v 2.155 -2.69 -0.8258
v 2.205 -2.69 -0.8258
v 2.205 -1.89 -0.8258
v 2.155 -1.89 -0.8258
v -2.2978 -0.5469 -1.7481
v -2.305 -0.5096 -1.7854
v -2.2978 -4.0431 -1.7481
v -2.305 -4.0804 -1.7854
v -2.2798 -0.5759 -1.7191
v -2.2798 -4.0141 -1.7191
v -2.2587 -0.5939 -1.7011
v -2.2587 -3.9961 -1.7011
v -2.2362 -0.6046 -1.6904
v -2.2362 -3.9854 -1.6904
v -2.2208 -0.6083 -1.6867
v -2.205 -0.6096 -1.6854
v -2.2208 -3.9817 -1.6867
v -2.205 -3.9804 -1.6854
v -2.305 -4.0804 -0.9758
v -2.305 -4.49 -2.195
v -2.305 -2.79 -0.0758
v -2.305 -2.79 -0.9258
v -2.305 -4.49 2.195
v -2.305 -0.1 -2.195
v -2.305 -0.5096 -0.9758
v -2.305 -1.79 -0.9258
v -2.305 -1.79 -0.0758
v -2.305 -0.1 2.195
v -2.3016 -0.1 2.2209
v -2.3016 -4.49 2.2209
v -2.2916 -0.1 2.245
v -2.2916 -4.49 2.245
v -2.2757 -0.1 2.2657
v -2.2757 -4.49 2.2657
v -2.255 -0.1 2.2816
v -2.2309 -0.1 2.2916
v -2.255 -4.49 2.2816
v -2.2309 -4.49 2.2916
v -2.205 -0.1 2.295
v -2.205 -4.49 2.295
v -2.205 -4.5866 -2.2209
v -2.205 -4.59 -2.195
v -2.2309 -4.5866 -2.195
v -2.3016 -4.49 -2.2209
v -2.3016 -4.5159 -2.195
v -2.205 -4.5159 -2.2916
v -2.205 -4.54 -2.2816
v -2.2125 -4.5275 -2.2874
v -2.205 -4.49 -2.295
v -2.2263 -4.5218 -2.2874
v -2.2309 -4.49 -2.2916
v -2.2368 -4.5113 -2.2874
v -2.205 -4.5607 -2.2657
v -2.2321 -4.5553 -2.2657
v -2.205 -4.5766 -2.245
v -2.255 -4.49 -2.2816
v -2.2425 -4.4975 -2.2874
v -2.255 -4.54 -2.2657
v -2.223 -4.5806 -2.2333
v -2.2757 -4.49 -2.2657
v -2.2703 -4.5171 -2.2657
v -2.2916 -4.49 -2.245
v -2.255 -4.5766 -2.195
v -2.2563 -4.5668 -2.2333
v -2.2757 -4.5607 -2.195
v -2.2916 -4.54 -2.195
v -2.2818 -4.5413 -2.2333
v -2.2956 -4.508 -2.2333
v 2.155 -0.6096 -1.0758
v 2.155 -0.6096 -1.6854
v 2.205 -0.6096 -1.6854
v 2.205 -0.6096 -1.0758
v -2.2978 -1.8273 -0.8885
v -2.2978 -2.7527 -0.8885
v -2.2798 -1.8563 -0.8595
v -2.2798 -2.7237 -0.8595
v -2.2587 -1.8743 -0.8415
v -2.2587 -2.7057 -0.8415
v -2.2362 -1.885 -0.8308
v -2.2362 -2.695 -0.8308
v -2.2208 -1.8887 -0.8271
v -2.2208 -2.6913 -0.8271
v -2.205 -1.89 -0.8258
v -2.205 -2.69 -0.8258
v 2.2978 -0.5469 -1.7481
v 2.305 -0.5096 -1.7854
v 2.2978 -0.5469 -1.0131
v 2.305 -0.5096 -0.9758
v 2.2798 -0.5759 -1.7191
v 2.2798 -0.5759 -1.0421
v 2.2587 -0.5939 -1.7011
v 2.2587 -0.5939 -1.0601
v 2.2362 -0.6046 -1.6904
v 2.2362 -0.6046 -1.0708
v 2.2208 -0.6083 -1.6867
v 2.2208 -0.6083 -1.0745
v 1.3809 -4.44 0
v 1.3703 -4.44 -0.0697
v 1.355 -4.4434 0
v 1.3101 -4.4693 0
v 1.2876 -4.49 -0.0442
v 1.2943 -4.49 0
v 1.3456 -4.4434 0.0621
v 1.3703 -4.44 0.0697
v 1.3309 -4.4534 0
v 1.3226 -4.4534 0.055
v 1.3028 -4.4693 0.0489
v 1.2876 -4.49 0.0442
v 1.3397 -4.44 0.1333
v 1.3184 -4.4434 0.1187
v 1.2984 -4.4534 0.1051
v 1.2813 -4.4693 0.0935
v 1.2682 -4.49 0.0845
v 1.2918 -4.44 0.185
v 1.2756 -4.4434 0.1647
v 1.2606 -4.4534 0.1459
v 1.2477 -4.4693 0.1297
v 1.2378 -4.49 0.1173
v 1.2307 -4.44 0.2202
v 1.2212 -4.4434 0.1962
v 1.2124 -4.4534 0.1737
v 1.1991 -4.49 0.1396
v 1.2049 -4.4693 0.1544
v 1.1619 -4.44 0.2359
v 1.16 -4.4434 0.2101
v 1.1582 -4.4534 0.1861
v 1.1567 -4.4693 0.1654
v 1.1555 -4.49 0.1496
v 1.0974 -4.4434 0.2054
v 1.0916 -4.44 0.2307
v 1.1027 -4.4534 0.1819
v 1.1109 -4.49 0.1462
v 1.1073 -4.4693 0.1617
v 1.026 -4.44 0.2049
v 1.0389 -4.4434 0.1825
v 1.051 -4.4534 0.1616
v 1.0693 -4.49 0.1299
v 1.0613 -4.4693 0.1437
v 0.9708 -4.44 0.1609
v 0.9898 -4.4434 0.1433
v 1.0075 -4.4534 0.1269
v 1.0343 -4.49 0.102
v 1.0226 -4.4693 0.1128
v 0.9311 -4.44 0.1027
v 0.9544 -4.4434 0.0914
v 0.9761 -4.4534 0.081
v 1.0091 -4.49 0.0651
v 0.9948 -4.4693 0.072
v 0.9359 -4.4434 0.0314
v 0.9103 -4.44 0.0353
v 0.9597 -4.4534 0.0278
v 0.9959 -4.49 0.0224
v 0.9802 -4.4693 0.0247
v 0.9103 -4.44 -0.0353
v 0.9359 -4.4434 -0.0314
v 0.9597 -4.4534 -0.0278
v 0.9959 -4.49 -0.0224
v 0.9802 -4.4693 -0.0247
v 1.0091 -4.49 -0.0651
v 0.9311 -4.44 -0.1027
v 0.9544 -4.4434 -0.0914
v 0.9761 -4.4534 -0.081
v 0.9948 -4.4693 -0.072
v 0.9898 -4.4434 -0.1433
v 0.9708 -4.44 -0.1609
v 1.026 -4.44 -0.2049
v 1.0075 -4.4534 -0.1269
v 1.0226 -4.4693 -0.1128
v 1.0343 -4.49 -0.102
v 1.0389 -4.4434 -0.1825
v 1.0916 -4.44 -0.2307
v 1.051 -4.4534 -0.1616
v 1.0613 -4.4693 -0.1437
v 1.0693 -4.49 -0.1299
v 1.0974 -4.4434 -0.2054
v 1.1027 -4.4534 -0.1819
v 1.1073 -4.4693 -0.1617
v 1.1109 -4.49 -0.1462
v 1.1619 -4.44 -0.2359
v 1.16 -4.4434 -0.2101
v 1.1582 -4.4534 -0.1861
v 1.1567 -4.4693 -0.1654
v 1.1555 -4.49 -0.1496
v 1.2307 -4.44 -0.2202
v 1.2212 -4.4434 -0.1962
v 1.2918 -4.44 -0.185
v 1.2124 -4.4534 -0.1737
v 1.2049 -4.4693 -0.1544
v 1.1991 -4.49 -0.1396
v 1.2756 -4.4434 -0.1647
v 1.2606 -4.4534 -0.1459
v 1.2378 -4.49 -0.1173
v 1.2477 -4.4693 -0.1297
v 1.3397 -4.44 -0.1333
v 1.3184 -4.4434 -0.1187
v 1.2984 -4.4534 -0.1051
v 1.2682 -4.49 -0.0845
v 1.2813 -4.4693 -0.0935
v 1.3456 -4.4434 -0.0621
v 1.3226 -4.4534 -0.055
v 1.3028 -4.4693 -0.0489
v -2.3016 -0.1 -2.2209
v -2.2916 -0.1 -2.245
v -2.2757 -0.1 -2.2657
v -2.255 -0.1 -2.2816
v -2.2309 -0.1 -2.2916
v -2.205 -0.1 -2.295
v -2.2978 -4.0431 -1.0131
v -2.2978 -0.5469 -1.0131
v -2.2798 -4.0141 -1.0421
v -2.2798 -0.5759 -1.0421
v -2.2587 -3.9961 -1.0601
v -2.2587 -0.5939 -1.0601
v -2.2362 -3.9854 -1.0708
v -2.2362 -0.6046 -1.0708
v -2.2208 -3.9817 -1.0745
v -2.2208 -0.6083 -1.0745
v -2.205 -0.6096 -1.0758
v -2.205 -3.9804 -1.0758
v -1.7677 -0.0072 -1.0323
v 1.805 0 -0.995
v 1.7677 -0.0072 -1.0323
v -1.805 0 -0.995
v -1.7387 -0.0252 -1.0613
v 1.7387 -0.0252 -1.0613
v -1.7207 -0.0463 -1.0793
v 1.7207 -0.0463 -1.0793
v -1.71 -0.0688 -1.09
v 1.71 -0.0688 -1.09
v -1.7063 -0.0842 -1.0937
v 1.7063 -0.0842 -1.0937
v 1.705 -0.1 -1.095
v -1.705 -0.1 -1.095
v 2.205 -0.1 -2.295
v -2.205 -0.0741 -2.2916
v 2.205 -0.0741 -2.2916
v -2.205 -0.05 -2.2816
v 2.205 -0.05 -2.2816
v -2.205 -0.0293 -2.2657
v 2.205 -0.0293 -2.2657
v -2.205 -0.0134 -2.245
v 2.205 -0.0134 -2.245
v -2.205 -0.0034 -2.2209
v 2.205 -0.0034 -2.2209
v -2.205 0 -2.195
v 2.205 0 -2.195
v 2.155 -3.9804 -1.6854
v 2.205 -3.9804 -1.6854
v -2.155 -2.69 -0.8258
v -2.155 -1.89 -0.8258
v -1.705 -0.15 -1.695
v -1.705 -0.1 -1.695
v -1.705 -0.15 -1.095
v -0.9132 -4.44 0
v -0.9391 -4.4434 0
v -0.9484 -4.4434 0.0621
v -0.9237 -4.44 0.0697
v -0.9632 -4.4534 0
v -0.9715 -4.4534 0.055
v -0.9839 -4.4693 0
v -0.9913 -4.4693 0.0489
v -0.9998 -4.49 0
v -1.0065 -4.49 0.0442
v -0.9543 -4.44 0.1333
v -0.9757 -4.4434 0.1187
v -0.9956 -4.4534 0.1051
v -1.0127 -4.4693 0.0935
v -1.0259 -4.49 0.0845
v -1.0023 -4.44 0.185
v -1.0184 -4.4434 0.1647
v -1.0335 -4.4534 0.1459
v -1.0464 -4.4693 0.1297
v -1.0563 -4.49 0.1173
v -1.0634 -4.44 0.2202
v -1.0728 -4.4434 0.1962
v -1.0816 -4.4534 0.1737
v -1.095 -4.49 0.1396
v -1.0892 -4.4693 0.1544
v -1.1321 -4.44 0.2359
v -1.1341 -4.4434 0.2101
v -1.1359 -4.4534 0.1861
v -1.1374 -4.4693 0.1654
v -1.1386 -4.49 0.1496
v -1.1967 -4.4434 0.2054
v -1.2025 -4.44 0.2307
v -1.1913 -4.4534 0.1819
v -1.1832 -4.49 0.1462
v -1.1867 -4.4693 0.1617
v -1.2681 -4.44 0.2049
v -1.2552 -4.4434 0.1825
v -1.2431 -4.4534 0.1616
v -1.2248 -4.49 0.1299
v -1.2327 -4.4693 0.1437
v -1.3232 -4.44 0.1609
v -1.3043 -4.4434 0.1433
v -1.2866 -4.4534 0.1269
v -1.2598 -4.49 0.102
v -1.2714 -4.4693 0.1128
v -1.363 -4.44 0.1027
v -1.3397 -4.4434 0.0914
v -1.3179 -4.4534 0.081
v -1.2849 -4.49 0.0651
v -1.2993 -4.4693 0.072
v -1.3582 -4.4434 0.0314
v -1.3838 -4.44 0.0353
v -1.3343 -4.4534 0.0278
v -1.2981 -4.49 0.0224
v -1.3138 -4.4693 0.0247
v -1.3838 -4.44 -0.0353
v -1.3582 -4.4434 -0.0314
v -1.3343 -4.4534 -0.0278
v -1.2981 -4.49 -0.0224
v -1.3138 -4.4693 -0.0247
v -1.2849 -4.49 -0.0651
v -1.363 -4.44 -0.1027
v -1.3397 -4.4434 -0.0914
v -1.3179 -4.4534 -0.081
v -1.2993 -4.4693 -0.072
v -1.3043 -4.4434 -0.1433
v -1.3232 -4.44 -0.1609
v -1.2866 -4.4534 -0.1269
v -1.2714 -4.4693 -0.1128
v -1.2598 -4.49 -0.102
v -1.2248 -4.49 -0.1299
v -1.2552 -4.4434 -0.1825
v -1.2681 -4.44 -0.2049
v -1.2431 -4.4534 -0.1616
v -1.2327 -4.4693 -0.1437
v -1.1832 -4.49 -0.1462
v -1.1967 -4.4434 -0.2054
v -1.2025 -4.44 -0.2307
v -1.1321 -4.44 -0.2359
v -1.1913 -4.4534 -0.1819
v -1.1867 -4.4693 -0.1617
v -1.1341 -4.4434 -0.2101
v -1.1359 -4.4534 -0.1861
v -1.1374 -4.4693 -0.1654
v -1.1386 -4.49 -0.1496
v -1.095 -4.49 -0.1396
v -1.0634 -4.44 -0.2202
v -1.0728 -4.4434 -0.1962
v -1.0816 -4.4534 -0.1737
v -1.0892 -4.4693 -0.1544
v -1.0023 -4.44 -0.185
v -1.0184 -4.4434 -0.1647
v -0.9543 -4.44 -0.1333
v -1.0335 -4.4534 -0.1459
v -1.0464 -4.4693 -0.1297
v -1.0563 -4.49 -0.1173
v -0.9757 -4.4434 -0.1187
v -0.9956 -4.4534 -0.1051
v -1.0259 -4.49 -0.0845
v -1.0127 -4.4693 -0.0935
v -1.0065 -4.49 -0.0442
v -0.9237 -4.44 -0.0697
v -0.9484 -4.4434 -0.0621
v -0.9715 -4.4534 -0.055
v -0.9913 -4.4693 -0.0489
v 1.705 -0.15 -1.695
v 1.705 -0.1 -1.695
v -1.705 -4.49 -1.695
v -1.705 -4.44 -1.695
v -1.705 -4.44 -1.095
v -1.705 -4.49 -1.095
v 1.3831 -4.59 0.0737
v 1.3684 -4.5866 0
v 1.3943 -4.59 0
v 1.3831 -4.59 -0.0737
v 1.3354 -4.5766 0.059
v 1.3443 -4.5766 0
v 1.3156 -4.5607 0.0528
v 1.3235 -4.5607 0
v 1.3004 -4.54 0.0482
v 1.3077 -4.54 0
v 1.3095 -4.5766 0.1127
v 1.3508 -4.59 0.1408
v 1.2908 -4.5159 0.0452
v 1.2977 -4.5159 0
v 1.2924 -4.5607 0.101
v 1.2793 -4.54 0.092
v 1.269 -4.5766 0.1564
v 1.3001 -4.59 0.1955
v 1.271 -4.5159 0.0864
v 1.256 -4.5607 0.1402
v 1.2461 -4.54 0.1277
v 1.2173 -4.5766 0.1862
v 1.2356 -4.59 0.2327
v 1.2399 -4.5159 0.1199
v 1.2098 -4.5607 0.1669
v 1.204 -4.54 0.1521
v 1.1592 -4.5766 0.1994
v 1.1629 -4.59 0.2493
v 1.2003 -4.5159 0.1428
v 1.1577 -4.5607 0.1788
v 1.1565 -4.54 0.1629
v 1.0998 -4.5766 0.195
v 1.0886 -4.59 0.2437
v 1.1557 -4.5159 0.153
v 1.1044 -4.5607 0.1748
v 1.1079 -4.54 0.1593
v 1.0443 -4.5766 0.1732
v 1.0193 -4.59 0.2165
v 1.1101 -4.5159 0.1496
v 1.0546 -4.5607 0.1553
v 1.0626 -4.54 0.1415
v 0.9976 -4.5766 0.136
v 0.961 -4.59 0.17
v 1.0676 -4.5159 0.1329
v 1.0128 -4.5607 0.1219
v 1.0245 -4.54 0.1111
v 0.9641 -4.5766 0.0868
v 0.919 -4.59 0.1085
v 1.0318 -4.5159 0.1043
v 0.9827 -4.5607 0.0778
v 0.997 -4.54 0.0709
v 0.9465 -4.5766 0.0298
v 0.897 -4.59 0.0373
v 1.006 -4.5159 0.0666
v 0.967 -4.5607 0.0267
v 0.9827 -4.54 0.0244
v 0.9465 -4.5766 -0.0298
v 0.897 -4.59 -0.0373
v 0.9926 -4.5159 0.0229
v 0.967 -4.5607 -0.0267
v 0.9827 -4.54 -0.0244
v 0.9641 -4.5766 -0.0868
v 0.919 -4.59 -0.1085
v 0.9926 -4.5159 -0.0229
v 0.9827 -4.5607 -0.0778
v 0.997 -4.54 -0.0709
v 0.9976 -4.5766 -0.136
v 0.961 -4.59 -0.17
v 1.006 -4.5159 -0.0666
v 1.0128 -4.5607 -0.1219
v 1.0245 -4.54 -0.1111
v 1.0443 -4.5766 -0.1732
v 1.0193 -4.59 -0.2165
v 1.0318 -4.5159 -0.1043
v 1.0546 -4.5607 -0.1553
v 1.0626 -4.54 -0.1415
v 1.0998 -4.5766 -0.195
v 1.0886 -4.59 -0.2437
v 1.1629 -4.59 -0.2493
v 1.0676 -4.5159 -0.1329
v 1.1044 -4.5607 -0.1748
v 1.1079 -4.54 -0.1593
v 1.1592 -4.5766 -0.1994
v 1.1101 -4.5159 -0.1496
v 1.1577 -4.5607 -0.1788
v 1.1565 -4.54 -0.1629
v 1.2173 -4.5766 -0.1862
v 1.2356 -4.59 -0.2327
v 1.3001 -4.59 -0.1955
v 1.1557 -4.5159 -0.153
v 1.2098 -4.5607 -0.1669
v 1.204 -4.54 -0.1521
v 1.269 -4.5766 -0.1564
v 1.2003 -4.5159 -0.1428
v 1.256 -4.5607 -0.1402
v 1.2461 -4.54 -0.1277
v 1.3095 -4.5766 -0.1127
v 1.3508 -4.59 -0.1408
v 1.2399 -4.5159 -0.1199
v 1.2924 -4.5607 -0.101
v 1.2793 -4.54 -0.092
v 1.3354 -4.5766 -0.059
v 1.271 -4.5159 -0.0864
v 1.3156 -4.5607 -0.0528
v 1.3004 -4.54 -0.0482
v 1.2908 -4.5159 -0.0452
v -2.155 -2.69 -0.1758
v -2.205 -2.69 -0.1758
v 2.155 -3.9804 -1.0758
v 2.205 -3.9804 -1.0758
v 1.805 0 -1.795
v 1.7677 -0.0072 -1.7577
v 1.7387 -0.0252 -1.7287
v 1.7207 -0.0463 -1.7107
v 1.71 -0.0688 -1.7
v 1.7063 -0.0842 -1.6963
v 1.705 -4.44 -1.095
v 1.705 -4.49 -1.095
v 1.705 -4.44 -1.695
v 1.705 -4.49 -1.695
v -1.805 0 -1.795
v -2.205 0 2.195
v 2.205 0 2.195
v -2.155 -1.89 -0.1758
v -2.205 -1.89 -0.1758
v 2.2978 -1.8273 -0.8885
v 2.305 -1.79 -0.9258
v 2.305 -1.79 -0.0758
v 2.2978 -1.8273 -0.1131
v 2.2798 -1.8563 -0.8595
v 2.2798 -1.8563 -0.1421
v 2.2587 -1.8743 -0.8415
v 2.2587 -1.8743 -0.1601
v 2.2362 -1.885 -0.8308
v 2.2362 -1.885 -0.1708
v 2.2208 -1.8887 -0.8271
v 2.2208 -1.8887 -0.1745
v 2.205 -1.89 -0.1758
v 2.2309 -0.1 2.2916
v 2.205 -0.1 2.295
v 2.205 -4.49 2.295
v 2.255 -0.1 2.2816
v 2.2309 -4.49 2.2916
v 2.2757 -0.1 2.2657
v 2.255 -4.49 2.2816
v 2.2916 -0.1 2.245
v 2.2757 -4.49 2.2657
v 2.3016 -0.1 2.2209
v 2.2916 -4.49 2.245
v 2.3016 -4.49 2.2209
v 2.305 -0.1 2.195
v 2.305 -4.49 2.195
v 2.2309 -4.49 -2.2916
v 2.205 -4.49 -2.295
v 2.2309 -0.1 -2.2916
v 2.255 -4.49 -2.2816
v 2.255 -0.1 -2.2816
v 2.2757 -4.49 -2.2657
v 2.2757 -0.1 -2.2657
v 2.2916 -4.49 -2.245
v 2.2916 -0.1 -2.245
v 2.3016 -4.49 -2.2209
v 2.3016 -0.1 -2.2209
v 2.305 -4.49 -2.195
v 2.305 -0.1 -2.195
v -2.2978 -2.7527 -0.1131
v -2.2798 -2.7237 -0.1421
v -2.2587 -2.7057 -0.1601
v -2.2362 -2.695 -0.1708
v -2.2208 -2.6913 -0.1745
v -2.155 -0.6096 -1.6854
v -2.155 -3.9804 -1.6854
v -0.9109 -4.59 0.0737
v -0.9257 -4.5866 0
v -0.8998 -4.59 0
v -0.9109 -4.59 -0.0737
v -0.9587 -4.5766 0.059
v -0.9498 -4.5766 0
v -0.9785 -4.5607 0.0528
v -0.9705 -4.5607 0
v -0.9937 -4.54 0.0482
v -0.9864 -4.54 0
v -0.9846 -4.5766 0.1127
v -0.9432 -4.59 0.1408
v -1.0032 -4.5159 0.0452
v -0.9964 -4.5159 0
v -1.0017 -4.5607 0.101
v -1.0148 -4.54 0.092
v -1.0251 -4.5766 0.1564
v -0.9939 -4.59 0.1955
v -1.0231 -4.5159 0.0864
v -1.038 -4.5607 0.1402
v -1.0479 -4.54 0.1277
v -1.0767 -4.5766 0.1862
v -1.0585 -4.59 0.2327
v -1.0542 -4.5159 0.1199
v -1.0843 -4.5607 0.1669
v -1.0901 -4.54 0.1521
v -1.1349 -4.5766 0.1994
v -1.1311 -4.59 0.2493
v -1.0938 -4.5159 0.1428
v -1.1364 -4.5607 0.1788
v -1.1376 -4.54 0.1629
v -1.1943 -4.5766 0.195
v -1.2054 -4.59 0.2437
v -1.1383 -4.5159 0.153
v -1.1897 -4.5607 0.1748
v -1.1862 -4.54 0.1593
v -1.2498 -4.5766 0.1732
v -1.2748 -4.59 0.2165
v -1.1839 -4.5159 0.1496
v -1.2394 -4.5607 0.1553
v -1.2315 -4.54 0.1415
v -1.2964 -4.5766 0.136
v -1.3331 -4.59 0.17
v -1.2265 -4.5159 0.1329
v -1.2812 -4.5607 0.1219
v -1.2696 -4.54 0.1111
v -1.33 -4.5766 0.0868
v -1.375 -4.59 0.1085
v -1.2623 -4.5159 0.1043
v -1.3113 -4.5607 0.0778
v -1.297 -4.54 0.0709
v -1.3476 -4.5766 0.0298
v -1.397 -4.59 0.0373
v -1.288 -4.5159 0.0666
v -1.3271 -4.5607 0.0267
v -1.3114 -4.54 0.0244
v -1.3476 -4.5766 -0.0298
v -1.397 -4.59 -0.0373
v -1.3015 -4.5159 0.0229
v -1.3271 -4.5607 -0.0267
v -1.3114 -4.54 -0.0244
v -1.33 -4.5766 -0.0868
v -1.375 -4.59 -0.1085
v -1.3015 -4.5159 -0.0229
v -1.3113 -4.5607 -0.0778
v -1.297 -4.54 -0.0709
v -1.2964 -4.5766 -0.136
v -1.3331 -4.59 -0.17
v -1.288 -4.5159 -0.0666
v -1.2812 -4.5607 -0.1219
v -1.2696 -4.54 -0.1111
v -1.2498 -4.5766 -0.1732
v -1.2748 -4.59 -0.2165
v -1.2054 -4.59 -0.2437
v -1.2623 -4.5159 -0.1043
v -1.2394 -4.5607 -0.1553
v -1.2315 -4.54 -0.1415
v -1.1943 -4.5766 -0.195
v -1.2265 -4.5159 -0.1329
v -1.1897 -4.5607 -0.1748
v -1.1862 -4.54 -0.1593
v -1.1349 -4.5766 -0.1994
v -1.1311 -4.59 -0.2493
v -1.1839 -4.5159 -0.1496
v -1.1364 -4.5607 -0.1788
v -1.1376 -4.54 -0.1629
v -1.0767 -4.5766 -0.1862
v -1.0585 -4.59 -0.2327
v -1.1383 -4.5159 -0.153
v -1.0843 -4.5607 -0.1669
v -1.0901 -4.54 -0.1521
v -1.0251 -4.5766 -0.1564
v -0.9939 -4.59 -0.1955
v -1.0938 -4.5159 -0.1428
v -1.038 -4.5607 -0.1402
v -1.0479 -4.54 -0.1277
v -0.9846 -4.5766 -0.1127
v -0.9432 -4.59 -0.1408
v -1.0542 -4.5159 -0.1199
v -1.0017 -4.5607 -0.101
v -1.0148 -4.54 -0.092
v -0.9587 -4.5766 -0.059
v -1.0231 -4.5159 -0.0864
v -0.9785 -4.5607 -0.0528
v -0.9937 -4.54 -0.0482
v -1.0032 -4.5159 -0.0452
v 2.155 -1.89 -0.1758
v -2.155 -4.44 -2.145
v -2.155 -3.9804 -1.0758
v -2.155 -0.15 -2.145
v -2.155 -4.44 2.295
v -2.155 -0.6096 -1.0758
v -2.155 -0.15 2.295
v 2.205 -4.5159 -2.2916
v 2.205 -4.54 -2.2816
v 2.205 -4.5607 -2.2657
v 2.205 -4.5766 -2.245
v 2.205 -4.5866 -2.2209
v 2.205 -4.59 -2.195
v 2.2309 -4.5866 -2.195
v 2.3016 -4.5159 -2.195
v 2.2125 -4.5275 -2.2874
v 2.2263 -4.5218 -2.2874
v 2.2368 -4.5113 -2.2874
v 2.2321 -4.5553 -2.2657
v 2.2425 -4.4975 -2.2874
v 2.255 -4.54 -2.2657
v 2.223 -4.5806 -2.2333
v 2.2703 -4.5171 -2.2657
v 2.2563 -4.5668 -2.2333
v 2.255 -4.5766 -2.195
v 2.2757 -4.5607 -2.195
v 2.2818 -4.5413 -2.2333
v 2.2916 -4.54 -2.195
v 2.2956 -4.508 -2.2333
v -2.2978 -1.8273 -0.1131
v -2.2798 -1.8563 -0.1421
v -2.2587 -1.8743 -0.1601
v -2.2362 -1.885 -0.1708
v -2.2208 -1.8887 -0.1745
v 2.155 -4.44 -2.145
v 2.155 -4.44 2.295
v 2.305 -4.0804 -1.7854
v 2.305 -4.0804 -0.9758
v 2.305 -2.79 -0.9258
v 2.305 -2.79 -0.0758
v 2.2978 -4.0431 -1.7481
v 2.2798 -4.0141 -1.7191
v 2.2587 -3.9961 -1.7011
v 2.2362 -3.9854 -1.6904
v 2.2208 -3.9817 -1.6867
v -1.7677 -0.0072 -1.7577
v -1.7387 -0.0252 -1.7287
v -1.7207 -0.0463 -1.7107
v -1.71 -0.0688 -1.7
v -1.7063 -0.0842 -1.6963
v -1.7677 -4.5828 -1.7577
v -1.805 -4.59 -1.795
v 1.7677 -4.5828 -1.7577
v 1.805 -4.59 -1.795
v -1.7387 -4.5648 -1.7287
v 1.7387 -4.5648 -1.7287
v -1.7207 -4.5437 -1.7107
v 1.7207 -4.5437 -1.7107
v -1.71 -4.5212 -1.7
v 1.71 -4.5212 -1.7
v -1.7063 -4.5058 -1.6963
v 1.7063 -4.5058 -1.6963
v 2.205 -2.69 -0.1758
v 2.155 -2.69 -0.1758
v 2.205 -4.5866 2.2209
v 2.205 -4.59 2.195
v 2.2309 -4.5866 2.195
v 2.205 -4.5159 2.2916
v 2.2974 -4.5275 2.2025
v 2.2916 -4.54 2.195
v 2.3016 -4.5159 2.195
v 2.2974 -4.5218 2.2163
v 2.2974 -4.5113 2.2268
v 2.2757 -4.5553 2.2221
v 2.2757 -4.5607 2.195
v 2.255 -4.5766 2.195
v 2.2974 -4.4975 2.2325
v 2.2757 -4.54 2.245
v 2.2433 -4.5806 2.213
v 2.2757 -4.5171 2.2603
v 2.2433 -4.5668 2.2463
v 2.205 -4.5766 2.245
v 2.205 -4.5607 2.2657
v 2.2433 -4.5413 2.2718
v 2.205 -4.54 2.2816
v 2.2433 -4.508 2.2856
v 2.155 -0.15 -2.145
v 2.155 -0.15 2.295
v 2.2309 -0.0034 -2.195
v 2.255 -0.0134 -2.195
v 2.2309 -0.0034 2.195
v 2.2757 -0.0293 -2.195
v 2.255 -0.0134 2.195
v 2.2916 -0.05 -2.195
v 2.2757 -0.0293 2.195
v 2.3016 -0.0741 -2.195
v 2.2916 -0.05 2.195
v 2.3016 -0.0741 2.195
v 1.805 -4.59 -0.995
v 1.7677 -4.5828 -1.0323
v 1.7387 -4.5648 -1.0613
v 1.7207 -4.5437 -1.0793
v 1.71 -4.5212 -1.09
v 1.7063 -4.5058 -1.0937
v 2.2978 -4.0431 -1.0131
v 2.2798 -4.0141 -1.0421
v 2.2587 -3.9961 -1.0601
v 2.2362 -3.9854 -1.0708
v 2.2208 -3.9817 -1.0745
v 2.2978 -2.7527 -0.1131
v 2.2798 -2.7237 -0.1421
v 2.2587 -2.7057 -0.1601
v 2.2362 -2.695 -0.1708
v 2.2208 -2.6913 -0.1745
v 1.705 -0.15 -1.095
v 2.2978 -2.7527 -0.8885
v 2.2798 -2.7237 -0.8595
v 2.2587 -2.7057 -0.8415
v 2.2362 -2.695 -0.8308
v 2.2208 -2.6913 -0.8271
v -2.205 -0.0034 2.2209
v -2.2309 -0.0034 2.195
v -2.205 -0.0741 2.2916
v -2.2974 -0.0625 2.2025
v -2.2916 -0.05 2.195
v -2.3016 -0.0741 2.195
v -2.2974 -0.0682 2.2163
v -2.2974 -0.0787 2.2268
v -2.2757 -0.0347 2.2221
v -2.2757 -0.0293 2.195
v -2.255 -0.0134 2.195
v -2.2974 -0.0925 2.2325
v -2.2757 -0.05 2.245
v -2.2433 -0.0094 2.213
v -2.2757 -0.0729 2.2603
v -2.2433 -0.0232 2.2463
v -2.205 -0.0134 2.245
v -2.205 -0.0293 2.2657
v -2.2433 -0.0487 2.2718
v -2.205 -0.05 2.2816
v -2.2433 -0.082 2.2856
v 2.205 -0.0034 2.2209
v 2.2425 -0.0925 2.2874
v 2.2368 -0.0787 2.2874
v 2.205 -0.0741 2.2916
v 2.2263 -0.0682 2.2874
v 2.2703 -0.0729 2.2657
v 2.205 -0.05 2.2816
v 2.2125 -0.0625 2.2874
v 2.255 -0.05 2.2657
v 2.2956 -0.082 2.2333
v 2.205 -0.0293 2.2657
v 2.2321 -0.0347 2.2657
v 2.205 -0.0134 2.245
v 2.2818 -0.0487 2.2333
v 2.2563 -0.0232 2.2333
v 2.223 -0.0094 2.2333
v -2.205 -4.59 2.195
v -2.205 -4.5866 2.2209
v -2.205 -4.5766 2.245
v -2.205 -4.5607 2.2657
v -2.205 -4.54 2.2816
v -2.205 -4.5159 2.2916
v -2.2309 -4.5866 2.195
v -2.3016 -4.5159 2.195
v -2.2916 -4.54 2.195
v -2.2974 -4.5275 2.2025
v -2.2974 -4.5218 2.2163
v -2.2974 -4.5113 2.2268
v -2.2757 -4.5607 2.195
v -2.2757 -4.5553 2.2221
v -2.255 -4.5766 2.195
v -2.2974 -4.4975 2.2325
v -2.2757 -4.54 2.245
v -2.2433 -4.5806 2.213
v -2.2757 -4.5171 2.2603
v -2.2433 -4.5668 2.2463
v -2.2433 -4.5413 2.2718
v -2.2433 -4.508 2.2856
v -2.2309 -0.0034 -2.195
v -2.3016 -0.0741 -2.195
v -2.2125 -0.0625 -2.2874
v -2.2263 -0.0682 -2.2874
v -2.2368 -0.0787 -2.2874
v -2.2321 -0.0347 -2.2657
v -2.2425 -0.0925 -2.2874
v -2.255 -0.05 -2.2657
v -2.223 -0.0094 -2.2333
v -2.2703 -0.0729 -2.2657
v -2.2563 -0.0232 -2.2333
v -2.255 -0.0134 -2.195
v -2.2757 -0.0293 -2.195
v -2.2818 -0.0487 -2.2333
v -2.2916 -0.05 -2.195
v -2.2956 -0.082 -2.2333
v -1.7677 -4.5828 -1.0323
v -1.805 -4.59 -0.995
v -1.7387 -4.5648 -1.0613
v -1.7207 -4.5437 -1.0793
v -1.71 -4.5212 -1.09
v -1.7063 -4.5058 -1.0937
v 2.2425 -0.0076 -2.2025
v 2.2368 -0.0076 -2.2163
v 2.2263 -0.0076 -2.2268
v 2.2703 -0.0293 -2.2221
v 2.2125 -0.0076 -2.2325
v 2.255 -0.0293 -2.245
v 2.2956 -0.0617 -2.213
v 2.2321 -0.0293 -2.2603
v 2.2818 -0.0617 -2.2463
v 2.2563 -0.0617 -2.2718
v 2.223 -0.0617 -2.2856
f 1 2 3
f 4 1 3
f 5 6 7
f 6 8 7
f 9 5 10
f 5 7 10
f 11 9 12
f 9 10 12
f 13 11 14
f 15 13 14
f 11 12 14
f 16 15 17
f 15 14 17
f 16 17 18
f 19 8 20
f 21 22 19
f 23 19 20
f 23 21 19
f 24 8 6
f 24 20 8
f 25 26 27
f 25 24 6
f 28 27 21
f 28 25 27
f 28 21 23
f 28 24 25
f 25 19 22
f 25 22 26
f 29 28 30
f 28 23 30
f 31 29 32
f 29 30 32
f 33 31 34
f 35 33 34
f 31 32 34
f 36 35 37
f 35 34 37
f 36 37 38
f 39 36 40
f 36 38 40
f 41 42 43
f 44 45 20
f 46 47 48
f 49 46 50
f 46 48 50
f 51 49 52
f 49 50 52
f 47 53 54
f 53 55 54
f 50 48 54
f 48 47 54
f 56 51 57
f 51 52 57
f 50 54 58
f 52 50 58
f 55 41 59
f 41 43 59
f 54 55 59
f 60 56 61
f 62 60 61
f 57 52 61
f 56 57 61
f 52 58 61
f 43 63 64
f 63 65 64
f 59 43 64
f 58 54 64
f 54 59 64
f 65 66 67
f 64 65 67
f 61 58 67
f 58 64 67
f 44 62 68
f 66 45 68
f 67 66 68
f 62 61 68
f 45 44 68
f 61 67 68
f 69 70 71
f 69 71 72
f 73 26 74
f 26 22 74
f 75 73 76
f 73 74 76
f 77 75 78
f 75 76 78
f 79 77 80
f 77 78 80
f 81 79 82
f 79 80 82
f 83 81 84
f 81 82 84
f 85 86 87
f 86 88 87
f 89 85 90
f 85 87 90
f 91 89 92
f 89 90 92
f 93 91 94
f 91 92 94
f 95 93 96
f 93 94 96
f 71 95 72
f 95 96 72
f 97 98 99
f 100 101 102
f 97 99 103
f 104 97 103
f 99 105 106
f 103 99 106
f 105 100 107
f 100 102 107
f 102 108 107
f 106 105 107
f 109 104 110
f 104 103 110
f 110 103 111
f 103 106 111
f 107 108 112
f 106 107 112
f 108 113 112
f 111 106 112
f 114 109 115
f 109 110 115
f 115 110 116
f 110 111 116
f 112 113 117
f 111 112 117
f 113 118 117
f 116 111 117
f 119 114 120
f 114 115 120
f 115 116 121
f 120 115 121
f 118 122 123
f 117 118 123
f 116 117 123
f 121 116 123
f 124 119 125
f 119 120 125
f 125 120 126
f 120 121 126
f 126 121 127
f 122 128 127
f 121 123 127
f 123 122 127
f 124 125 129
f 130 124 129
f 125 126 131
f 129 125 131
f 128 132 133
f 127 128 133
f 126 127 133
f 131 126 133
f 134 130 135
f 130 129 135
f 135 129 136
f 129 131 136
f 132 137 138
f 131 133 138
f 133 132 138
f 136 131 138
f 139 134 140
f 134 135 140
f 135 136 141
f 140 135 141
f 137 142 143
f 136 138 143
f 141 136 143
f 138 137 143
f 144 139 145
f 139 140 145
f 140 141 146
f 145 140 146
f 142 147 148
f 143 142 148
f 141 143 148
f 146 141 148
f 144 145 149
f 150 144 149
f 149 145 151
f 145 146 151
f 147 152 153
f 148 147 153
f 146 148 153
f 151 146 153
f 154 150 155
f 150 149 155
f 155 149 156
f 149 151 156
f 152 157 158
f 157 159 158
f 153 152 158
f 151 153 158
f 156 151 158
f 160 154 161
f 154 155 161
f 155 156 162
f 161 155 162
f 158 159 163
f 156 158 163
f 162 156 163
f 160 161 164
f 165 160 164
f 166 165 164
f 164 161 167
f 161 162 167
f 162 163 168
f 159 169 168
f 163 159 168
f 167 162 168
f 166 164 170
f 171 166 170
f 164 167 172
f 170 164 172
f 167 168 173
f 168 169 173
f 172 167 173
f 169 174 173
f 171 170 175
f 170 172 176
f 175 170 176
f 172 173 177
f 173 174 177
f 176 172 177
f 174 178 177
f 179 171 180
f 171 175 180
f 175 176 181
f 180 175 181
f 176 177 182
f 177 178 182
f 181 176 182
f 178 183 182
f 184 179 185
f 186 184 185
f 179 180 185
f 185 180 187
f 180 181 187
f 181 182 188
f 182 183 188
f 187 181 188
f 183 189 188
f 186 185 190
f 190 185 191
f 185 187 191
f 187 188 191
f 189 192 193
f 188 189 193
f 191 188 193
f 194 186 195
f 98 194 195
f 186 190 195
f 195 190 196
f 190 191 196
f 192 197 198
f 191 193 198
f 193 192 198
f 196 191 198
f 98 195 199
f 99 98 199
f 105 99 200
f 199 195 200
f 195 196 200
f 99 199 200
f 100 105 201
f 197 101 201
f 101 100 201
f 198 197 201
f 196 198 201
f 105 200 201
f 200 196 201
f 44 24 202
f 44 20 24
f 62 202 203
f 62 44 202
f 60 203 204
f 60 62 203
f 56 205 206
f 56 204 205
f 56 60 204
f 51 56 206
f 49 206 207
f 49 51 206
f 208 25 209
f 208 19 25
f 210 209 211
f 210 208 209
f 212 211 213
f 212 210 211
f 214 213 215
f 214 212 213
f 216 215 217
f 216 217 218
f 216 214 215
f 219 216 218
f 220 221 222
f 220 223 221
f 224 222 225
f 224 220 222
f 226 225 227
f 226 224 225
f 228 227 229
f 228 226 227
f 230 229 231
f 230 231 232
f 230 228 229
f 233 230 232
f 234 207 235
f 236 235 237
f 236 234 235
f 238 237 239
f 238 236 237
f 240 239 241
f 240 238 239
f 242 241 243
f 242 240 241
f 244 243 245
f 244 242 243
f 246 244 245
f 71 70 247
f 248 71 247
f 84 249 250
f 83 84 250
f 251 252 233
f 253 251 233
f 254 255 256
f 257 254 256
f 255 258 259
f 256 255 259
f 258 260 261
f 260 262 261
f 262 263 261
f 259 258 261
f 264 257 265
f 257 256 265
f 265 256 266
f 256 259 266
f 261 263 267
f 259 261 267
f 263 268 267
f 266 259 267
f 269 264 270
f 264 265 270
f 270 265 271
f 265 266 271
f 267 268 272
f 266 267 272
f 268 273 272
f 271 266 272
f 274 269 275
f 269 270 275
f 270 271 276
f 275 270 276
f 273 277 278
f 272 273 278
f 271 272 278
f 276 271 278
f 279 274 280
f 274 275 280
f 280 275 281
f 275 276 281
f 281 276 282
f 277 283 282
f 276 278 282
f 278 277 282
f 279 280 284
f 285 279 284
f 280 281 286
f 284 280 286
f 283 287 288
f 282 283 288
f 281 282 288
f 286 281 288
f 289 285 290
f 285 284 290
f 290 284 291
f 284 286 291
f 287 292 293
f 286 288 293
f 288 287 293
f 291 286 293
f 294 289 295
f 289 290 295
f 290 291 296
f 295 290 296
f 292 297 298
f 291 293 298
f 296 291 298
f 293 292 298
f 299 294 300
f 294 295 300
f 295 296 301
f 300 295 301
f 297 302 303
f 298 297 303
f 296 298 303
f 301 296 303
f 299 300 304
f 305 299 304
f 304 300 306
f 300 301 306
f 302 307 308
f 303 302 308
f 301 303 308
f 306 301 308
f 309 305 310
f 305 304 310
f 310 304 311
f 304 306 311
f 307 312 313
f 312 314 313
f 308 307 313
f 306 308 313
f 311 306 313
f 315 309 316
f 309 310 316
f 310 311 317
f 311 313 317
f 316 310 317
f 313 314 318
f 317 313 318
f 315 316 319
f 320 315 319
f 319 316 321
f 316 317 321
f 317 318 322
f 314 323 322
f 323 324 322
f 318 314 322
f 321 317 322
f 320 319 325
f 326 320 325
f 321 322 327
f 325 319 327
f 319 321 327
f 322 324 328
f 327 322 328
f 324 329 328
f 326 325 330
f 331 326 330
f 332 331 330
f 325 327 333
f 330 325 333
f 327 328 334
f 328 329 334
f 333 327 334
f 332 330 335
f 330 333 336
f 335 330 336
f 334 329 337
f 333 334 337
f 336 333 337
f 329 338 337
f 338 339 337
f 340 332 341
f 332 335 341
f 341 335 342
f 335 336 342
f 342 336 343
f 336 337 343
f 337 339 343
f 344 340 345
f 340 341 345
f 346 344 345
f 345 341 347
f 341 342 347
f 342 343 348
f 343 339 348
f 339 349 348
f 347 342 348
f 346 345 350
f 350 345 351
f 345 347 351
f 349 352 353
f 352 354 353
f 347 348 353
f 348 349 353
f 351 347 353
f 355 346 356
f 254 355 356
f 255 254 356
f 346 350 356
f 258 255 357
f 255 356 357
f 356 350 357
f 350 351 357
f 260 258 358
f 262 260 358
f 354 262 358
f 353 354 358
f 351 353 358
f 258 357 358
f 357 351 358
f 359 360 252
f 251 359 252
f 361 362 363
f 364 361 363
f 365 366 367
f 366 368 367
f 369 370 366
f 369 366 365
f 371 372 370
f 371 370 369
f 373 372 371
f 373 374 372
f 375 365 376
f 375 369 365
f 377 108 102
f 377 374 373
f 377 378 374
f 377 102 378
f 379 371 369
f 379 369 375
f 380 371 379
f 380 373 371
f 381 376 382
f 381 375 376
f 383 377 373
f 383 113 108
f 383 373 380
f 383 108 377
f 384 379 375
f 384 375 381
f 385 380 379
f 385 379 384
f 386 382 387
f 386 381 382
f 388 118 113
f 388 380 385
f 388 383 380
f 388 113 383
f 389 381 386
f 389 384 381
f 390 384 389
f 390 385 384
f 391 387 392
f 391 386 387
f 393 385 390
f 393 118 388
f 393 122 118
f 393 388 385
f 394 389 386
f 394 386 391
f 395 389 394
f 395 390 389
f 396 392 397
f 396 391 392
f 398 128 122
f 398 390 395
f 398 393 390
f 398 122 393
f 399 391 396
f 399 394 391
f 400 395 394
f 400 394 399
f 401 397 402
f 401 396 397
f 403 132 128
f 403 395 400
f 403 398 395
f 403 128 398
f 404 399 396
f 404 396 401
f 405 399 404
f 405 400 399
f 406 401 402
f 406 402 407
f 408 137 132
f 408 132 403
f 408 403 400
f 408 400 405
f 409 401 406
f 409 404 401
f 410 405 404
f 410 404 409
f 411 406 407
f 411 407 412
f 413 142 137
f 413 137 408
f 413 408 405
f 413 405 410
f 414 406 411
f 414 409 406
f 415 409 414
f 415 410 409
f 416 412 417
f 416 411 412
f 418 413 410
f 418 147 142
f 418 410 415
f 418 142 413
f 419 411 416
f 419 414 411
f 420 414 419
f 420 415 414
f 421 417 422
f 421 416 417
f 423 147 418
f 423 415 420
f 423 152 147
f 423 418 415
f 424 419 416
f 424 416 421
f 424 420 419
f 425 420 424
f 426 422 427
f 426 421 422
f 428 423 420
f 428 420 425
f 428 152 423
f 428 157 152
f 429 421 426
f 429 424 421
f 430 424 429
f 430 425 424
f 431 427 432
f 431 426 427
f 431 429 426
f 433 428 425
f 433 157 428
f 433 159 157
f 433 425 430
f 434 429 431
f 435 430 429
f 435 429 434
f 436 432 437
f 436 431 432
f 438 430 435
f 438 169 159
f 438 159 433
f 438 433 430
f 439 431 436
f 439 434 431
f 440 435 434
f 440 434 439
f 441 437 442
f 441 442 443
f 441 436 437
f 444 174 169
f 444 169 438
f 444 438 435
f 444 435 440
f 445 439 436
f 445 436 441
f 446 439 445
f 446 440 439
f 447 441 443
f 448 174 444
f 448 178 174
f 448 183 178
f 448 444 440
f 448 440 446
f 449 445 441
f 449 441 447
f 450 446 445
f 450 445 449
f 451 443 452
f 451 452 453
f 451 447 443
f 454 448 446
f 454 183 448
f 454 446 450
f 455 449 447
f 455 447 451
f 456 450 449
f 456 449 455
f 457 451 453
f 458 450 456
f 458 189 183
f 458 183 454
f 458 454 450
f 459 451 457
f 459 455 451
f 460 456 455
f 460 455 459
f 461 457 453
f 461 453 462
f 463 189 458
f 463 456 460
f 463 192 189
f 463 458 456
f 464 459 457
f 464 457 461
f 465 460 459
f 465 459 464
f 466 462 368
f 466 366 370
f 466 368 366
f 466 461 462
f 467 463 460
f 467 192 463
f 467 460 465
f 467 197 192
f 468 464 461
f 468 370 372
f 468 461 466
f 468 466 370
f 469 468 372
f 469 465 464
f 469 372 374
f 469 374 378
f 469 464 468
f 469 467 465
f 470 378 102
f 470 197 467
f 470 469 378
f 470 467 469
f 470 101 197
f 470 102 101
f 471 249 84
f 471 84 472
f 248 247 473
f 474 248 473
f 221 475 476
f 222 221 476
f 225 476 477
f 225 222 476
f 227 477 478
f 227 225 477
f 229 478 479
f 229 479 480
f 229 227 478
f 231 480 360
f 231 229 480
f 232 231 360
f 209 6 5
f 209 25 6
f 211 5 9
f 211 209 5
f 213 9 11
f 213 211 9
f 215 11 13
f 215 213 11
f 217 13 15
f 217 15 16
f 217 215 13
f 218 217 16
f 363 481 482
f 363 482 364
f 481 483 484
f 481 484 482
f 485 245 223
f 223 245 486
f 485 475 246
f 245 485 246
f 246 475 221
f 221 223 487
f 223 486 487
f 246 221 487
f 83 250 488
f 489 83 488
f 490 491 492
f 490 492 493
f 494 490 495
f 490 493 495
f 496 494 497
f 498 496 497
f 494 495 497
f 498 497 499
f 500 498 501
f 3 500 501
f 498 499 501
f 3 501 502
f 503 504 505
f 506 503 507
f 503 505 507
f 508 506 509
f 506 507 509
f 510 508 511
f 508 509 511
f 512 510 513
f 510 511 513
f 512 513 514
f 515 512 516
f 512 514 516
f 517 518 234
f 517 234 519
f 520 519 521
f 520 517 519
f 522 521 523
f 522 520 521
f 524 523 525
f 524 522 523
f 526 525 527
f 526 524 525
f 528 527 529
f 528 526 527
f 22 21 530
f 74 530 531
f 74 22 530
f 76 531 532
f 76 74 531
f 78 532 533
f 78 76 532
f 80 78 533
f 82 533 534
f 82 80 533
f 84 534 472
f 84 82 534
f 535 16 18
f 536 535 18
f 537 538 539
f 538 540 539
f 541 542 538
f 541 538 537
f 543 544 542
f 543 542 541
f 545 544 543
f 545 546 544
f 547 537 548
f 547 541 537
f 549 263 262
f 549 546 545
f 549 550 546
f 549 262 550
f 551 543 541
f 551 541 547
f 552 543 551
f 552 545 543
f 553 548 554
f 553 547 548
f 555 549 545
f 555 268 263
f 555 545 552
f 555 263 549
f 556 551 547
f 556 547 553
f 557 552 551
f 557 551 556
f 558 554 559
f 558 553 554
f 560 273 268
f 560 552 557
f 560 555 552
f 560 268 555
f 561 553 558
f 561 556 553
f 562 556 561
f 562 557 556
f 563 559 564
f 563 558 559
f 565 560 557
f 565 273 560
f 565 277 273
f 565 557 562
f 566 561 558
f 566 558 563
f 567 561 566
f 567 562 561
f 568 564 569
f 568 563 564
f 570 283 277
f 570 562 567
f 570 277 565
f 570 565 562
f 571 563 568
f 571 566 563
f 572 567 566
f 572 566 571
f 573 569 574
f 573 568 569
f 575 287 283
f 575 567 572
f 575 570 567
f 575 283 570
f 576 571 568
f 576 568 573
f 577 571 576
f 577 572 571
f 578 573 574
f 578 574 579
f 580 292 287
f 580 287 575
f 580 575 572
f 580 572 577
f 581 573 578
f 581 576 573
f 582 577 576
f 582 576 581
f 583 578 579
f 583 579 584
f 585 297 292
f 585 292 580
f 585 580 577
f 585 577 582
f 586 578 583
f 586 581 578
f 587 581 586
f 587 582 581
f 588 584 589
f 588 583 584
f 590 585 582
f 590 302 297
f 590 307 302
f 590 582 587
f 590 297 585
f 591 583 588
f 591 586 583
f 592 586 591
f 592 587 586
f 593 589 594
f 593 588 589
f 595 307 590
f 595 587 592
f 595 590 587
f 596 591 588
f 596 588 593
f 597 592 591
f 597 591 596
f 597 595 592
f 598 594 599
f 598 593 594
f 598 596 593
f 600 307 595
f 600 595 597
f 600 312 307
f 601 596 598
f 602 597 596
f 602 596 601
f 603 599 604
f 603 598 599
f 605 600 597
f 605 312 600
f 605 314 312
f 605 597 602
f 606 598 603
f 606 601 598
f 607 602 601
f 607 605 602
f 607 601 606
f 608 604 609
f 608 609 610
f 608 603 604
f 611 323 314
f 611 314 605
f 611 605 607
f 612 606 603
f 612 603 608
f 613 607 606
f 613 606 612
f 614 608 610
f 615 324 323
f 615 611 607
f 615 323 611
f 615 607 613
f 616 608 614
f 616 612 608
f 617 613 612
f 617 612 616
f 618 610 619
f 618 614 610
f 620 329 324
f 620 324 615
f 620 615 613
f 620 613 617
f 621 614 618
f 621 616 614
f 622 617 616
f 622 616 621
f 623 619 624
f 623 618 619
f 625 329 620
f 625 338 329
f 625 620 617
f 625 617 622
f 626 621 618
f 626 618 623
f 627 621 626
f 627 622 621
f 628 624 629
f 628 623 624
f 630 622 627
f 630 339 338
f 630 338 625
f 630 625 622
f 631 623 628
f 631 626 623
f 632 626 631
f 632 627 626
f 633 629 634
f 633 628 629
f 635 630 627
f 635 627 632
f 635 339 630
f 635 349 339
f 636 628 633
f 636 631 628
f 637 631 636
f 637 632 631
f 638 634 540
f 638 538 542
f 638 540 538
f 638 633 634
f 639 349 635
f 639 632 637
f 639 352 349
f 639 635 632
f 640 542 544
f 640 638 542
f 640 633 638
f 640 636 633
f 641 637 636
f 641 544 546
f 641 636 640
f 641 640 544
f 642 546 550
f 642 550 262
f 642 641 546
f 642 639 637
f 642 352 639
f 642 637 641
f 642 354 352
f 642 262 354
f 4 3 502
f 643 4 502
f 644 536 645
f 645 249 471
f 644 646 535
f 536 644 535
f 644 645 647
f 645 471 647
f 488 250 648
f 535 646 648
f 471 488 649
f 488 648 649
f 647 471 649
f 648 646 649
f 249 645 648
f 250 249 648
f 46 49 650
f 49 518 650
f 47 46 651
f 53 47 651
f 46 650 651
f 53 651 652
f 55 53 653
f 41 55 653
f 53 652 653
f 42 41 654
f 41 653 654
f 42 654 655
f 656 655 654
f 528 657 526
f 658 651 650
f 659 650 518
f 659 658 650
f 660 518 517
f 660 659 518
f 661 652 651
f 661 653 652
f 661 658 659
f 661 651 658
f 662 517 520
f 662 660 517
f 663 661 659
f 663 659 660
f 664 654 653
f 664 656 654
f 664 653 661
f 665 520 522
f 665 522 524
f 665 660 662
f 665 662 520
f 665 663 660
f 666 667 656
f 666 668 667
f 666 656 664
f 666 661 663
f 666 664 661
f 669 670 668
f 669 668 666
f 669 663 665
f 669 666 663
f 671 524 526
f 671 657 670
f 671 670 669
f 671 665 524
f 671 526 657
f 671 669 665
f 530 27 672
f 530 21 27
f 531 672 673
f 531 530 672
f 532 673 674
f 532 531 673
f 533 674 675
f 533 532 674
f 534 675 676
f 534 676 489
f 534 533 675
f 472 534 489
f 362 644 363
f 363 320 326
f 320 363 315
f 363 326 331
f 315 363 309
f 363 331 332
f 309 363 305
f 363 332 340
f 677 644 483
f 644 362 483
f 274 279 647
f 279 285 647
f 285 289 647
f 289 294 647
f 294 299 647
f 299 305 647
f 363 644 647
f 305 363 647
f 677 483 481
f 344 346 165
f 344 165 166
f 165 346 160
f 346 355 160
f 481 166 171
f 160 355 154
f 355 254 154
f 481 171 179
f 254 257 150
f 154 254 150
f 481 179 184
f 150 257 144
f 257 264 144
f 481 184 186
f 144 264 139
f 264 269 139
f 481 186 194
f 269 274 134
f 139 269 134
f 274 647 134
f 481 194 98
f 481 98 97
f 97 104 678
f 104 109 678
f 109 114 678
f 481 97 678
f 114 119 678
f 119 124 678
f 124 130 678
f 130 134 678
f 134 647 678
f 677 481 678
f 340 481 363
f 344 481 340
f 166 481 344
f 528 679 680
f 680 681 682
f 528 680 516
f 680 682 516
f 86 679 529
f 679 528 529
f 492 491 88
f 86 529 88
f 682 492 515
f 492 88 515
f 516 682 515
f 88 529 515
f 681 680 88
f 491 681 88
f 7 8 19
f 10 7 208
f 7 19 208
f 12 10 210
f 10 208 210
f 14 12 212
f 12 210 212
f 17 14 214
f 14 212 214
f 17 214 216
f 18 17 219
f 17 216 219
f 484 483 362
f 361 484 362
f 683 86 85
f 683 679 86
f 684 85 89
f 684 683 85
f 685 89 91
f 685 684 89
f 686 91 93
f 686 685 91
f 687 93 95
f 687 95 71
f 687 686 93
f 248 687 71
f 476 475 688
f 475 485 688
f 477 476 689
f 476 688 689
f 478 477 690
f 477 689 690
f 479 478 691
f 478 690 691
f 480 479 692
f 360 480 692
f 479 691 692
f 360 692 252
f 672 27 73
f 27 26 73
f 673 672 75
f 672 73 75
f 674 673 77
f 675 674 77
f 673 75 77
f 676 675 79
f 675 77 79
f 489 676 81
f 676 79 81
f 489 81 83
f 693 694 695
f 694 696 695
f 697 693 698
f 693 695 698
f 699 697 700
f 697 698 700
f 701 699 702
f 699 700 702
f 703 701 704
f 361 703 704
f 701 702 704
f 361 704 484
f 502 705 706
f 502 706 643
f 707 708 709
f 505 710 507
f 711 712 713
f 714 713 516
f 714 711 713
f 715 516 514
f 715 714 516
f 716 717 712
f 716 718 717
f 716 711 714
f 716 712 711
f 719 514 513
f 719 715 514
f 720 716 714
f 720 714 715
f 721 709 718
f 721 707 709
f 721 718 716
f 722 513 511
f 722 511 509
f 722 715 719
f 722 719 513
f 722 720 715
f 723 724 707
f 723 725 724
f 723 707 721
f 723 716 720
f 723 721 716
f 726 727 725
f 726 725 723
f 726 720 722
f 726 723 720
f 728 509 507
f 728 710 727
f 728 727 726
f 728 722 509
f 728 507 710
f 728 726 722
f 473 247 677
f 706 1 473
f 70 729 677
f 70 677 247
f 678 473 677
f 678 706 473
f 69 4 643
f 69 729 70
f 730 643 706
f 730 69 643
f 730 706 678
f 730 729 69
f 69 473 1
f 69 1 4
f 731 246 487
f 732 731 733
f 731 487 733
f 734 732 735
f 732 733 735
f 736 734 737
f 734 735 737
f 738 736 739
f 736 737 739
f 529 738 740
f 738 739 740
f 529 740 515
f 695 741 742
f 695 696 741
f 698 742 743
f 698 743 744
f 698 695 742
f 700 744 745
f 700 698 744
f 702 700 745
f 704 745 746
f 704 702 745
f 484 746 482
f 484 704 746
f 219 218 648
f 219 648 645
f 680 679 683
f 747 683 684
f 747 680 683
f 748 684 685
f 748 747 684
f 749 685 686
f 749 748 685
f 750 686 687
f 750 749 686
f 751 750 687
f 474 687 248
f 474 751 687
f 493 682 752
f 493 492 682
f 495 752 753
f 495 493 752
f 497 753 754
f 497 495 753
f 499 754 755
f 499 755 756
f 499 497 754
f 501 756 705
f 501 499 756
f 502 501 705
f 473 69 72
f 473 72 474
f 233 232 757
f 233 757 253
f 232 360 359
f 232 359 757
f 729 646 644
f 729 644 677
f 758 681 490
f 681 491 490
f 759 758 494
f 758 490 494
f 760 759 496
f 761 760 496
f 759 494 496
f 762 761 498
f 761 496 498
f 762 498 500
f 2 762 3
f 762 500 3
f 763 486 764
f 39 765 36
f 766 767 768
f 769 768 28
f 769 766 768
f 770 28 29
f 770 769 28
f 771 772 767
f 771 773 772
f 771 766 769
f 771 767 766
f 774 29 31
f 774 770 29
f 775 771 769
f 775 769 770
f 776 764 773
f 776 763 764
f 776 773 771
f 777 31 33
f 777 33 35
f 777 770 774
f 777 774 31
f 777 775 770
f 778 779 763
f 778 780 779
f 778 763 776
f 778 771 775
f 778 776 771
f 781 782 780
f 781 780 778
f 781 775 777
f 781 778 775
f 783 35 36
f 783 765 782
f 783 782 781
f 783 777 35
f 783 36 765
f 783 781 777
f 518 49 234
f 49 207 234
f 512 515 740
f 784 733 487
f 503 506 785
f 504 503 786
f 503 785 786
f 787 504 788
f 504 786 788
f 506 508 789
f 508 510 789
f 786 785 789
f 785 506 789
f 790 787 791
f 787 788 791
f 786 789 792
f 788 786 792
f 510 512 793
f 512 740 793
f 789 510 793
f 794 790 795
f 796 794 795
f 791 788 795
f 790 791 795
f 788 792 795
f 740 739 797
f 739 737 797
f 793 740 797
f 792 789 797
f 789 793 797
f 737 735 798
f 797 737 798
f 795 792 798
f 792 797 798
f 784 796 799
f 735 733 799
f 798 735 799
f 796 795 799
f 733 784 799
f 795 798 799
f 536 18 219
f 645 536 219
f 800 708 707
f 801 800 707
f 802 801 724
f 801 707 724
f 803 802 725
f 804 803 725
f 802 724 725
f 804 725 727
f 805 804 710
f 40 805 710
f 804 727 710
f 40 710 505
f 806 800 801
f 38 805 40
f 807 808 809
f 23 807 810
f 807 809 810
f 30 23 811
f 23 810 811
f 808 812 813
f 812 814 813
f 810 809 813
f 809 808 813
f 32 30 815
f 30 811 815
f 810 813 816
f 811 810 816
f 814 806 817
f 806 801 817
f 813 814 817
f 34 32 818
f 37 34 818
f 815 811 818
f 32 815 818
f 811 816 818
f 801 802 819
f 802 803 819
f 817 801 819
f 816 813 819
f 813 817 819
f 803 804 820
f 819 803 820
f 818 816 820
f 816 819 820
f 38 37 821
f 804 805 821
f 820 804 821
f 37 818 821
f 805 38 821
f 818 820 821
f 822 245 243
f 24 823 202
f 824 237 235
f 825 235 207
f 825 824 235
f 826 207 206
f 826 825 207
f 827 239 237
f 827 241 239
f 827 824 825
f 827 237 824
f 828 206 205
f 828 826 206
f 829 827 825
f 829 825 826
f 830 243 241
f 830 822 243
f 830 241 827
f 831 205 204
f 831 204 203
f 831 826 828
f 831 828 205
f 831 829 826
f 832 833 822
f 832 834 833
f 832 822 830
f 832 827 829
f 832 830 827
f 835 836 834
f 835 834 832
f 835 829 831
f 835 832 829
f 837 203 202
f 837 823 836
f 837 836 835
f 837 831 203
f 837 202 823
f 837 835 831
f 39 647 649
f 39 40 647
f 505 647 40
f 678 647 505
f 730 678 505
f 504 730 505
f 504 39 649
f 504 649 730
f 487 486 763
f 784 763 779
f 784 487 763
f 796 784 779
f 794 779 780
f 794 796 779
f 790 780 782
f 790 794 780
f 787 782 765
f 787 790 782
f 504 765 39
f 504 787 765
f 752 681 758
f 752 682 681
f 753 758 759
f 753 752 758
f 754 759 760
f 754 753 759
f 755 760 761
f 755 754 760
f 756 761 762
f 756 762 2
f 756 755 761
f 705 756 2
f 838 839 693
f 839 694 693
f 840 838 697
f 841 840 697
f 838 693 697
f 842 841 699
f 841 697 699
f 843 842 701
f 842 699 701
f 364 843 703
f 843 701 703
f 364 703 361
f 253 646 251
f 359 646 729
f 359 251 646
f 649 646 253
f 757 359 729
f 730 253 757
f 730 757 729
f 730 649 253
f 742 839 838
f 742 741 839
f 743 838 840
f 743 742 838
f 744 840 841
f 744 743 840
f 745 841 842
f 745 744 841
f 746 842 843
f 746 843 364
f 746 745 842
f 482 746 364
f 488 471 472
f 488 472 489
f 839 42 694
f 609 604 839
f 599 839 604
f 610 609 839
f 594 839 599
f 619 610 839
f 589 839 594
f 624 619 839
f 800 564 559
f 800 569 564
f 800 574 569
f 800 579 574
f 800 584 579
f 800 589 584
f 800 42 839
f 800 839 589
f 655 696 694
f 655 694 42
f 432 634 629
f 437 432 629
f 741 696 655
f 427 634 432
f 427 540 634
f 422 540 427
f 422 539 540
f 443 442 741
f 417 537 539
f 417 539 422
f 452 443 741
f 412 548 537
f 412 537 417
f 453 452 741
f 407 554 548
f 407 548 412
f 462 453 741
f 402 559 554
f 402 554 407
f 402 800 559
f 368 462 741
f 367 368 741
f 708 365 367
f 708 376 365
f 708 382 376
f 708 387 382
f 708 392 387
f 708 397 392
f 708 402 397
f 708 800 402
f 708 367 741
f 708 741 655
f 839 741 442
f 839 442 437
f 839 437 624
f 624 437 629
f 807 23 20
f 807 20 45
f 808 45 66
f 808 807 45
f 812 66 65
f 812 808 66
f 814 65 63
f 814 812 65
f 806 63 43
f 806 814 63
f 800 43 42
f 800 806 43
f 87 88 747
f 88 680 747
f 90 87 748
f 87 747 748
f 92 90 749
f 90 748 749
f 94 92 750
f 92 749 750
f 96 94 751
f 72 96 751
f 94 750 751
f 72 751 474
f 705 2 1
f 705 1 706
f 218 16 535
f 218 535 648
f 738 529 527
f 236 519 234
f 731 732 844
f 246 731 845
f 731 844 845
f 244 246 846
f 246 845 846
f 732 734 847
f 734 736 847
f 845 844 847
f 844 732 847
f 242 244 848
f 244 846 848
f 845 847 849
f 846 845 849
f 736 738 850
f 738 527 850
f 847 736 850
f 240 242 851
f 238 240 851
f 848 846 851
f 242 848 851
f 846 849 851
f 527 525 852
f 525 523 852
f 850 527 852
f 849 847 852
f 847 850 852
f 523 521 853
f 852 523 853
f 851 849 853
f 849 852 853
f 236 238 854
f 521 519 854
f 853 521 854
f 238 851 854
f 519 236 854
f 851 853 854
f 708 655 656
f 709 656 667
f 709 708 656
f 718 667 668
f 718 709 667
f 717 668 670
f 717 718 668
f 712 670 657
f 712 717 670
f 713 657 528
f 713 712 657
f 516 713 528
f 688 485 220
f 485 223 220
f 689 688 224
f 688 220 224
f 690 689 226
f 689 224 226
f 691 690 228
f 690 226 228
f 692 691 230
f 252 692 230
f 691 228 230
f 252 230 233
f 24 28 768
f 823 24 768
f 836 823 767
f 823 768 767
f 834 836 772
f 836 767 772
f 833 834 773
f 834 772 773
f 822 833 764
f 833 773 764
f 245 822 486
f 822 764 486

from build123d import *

# Parameters (mm, degrees)
F0_W      = 4.61
F0_H      = 4.59
F1_DEPTH  = 4.59
F2_T      = -0.15
F3_R      = 0.15
F4_DEPTH  = 0.2
F5_W      = 3.41
F5_H      = 0.6
F6_DEPTH  = 4.7
F7_W      = 3.3708
F7_H      = 0.6096
F8_DEPTH  = 4.7
F9_W      = 0.8
F9_H      = 0.65
F10_DEPTH = 4.7
F11_R     = 0.1


# Not quite as in the source:
# - a fillet or chamfer that OpenCascade refuses, or shapes differently, is made with other operations: its cross-section is extruded or revolved along the edge and cut away or added


with BuildPart() as f1:
    # F0 (on Front) → F1 (new body)
    with BuildSketch(Plane.XZ):
        Rectangle(F0_W, F0_H)
    extrude(amount=F1_DEPTH)

    # F2
    f2_openings = [f1.faces().sort_by_distance(p)[0] for p in [
        (0, -2.295, 2.295),
    ]]
    offset(amount=F2_T, openings=f2_openings)

    # F3 (on face) → F4 (cut)
    with BuildSketch(Plane.XZ.offset(4.59)):
        with Locations((1.1442566571, 0)):
            Circle(F3_R)
        with Locations((-1.1498022541, 0)):
            Circle(F3_R)
    extrude(amount=-F4_DEPTH, mode=Mode.SUBTRACT)

    # F5 (on face) → F6 (cut)
    with BuildSketch(Plane(origin=(0, 0, 0), x_dir=(-1, 0, 0), z_dir=(0, 1, 0))):
        with Locations((0, -1.395)):
            Rectangle(F5_W, F5_H)
    extrude(amount=-F6_DEPTH, mode=Mode.SUBTRACT)

    # F7 (on face) → F8 (cut)
    with BuildSketch(Plane(origin=(-2.305, 0, 0), x_dir=(0, -1, 0), z_dir=(-1, 0, 0))):
        with Locations((2.295, -1.3806)):
            Rectangle(F7_W, F7_H)
    extrude(amount=-F8_DEPTH, mode=Mode.SUBTRACT)

    # F9 (on face) → F10 (cut)
    with BuildSketch(Plane.YZ.offset(2.305)):
        with Locations((-2.29, -0.5008)):
            Rectangle(F9_W, F9_H)
    extrude(amount=-F10_DEPTH, mode=Mode.SUBTRACT)

    # F11
    f11_edges = [f1.edges().sort_by_distance(p)[0] for p in [
        (0, -4.59, 2.295),
        (2.305, -4.59, 0),
        (-2.305, -4.59, 0),
        (0, -4.59, -2.295),
        (0, -4.59, -1.095),
        (-1.705, -4.59, -1.395),
        (0, -4.59, -1.695),
        (1.705, -4.59, -1.395),
        (-1.299802, -4.59, 0),
        (0.994257, -4.59, 0),
        (2.305, -2.295, -2.295),
        (2.305, 0, 0),
        (2.305, -2.295, 2.295),
        (2.305, -2.295, -1.0758),
        (2.305, -3.9804, -1.3806),
        (2.305, -0.6096, -1.3806),
        (2.305, -2.295, -1.6854),
        (2.305, -2.29, -0.8258),
        (2.305, -2.69, -0.5008),
        (2.305, -2.29, -0.1758),
        (2.305, -1.89, -0.5008),
        (0, 0, 2.295),
        (-2.305, 0, 0),
        (0, 0, -2.295),
        (-1.705, 0, -1.395),
        (0, 0, -1.695),
        (1.705, 0, -1.395),
        (0, 0, -1.095),
        (-2.305, -2.295, 2.295),
        (-2.305, -2.295, -2.295),
        (-2.305, -3.9804, -1.3806),
        (-2.305, -2.295, -1.6854),
        (-2.305, -2.295, -1.0758),
        (-2.305, -0.6096, -1.3806),
        (-2.305, -1.89, -0.5008),
        (-2.305, -2.29, -0.1758),
        (-2.305, -2.69, -0.5008),
        (-2.305, -2.29, -0.8258),
    ]]
    fillet(f11_edges, radius=F11_R)

    # F12: fillet of radius 0.1 on 2 edges, made by hand

    # F12_s1 → F12_t2 (revolve, cut)
    with BuildSketch(Plane.XY):
        with BuildLine():
            ThreePointArc((1.3808591975, -4.44), (1.3308591975, -4.4533974596), (1.2942566571, -4.49))
            Line((1.2942566571, -4.49), (1.2942566571, -4.44))
            Line((1.2942566571, -4.44), (1.3808591975, -4.44))
        make_face()
    revolve(axis=Axis((1.1442566571, -4.44, 0), (0, -1, 0)), mode=Mode.SUBTRACT)

    # F12_s3 → F12_t4 (revolve, cut)
    with BuildSketch(Plane.XY):
        with BuildLine():
            ThreePointArc((-0.9131997137, -4.44), (-0.9631997137, -4.4533974596), (-0.9998022541, -4.49))
            Line((-0.9998022541, -4.49), (-0.9998022541, -4.44))
            Line((-0.9998022541, -4.44), (-0.9131997137, -4.44))
        make_face()
    revolve(axis=Axis((-1.1498022541, -4.44, 0), (0, -1, 0)), mode=Mode.SUBTRACT)


solid = f1.part
